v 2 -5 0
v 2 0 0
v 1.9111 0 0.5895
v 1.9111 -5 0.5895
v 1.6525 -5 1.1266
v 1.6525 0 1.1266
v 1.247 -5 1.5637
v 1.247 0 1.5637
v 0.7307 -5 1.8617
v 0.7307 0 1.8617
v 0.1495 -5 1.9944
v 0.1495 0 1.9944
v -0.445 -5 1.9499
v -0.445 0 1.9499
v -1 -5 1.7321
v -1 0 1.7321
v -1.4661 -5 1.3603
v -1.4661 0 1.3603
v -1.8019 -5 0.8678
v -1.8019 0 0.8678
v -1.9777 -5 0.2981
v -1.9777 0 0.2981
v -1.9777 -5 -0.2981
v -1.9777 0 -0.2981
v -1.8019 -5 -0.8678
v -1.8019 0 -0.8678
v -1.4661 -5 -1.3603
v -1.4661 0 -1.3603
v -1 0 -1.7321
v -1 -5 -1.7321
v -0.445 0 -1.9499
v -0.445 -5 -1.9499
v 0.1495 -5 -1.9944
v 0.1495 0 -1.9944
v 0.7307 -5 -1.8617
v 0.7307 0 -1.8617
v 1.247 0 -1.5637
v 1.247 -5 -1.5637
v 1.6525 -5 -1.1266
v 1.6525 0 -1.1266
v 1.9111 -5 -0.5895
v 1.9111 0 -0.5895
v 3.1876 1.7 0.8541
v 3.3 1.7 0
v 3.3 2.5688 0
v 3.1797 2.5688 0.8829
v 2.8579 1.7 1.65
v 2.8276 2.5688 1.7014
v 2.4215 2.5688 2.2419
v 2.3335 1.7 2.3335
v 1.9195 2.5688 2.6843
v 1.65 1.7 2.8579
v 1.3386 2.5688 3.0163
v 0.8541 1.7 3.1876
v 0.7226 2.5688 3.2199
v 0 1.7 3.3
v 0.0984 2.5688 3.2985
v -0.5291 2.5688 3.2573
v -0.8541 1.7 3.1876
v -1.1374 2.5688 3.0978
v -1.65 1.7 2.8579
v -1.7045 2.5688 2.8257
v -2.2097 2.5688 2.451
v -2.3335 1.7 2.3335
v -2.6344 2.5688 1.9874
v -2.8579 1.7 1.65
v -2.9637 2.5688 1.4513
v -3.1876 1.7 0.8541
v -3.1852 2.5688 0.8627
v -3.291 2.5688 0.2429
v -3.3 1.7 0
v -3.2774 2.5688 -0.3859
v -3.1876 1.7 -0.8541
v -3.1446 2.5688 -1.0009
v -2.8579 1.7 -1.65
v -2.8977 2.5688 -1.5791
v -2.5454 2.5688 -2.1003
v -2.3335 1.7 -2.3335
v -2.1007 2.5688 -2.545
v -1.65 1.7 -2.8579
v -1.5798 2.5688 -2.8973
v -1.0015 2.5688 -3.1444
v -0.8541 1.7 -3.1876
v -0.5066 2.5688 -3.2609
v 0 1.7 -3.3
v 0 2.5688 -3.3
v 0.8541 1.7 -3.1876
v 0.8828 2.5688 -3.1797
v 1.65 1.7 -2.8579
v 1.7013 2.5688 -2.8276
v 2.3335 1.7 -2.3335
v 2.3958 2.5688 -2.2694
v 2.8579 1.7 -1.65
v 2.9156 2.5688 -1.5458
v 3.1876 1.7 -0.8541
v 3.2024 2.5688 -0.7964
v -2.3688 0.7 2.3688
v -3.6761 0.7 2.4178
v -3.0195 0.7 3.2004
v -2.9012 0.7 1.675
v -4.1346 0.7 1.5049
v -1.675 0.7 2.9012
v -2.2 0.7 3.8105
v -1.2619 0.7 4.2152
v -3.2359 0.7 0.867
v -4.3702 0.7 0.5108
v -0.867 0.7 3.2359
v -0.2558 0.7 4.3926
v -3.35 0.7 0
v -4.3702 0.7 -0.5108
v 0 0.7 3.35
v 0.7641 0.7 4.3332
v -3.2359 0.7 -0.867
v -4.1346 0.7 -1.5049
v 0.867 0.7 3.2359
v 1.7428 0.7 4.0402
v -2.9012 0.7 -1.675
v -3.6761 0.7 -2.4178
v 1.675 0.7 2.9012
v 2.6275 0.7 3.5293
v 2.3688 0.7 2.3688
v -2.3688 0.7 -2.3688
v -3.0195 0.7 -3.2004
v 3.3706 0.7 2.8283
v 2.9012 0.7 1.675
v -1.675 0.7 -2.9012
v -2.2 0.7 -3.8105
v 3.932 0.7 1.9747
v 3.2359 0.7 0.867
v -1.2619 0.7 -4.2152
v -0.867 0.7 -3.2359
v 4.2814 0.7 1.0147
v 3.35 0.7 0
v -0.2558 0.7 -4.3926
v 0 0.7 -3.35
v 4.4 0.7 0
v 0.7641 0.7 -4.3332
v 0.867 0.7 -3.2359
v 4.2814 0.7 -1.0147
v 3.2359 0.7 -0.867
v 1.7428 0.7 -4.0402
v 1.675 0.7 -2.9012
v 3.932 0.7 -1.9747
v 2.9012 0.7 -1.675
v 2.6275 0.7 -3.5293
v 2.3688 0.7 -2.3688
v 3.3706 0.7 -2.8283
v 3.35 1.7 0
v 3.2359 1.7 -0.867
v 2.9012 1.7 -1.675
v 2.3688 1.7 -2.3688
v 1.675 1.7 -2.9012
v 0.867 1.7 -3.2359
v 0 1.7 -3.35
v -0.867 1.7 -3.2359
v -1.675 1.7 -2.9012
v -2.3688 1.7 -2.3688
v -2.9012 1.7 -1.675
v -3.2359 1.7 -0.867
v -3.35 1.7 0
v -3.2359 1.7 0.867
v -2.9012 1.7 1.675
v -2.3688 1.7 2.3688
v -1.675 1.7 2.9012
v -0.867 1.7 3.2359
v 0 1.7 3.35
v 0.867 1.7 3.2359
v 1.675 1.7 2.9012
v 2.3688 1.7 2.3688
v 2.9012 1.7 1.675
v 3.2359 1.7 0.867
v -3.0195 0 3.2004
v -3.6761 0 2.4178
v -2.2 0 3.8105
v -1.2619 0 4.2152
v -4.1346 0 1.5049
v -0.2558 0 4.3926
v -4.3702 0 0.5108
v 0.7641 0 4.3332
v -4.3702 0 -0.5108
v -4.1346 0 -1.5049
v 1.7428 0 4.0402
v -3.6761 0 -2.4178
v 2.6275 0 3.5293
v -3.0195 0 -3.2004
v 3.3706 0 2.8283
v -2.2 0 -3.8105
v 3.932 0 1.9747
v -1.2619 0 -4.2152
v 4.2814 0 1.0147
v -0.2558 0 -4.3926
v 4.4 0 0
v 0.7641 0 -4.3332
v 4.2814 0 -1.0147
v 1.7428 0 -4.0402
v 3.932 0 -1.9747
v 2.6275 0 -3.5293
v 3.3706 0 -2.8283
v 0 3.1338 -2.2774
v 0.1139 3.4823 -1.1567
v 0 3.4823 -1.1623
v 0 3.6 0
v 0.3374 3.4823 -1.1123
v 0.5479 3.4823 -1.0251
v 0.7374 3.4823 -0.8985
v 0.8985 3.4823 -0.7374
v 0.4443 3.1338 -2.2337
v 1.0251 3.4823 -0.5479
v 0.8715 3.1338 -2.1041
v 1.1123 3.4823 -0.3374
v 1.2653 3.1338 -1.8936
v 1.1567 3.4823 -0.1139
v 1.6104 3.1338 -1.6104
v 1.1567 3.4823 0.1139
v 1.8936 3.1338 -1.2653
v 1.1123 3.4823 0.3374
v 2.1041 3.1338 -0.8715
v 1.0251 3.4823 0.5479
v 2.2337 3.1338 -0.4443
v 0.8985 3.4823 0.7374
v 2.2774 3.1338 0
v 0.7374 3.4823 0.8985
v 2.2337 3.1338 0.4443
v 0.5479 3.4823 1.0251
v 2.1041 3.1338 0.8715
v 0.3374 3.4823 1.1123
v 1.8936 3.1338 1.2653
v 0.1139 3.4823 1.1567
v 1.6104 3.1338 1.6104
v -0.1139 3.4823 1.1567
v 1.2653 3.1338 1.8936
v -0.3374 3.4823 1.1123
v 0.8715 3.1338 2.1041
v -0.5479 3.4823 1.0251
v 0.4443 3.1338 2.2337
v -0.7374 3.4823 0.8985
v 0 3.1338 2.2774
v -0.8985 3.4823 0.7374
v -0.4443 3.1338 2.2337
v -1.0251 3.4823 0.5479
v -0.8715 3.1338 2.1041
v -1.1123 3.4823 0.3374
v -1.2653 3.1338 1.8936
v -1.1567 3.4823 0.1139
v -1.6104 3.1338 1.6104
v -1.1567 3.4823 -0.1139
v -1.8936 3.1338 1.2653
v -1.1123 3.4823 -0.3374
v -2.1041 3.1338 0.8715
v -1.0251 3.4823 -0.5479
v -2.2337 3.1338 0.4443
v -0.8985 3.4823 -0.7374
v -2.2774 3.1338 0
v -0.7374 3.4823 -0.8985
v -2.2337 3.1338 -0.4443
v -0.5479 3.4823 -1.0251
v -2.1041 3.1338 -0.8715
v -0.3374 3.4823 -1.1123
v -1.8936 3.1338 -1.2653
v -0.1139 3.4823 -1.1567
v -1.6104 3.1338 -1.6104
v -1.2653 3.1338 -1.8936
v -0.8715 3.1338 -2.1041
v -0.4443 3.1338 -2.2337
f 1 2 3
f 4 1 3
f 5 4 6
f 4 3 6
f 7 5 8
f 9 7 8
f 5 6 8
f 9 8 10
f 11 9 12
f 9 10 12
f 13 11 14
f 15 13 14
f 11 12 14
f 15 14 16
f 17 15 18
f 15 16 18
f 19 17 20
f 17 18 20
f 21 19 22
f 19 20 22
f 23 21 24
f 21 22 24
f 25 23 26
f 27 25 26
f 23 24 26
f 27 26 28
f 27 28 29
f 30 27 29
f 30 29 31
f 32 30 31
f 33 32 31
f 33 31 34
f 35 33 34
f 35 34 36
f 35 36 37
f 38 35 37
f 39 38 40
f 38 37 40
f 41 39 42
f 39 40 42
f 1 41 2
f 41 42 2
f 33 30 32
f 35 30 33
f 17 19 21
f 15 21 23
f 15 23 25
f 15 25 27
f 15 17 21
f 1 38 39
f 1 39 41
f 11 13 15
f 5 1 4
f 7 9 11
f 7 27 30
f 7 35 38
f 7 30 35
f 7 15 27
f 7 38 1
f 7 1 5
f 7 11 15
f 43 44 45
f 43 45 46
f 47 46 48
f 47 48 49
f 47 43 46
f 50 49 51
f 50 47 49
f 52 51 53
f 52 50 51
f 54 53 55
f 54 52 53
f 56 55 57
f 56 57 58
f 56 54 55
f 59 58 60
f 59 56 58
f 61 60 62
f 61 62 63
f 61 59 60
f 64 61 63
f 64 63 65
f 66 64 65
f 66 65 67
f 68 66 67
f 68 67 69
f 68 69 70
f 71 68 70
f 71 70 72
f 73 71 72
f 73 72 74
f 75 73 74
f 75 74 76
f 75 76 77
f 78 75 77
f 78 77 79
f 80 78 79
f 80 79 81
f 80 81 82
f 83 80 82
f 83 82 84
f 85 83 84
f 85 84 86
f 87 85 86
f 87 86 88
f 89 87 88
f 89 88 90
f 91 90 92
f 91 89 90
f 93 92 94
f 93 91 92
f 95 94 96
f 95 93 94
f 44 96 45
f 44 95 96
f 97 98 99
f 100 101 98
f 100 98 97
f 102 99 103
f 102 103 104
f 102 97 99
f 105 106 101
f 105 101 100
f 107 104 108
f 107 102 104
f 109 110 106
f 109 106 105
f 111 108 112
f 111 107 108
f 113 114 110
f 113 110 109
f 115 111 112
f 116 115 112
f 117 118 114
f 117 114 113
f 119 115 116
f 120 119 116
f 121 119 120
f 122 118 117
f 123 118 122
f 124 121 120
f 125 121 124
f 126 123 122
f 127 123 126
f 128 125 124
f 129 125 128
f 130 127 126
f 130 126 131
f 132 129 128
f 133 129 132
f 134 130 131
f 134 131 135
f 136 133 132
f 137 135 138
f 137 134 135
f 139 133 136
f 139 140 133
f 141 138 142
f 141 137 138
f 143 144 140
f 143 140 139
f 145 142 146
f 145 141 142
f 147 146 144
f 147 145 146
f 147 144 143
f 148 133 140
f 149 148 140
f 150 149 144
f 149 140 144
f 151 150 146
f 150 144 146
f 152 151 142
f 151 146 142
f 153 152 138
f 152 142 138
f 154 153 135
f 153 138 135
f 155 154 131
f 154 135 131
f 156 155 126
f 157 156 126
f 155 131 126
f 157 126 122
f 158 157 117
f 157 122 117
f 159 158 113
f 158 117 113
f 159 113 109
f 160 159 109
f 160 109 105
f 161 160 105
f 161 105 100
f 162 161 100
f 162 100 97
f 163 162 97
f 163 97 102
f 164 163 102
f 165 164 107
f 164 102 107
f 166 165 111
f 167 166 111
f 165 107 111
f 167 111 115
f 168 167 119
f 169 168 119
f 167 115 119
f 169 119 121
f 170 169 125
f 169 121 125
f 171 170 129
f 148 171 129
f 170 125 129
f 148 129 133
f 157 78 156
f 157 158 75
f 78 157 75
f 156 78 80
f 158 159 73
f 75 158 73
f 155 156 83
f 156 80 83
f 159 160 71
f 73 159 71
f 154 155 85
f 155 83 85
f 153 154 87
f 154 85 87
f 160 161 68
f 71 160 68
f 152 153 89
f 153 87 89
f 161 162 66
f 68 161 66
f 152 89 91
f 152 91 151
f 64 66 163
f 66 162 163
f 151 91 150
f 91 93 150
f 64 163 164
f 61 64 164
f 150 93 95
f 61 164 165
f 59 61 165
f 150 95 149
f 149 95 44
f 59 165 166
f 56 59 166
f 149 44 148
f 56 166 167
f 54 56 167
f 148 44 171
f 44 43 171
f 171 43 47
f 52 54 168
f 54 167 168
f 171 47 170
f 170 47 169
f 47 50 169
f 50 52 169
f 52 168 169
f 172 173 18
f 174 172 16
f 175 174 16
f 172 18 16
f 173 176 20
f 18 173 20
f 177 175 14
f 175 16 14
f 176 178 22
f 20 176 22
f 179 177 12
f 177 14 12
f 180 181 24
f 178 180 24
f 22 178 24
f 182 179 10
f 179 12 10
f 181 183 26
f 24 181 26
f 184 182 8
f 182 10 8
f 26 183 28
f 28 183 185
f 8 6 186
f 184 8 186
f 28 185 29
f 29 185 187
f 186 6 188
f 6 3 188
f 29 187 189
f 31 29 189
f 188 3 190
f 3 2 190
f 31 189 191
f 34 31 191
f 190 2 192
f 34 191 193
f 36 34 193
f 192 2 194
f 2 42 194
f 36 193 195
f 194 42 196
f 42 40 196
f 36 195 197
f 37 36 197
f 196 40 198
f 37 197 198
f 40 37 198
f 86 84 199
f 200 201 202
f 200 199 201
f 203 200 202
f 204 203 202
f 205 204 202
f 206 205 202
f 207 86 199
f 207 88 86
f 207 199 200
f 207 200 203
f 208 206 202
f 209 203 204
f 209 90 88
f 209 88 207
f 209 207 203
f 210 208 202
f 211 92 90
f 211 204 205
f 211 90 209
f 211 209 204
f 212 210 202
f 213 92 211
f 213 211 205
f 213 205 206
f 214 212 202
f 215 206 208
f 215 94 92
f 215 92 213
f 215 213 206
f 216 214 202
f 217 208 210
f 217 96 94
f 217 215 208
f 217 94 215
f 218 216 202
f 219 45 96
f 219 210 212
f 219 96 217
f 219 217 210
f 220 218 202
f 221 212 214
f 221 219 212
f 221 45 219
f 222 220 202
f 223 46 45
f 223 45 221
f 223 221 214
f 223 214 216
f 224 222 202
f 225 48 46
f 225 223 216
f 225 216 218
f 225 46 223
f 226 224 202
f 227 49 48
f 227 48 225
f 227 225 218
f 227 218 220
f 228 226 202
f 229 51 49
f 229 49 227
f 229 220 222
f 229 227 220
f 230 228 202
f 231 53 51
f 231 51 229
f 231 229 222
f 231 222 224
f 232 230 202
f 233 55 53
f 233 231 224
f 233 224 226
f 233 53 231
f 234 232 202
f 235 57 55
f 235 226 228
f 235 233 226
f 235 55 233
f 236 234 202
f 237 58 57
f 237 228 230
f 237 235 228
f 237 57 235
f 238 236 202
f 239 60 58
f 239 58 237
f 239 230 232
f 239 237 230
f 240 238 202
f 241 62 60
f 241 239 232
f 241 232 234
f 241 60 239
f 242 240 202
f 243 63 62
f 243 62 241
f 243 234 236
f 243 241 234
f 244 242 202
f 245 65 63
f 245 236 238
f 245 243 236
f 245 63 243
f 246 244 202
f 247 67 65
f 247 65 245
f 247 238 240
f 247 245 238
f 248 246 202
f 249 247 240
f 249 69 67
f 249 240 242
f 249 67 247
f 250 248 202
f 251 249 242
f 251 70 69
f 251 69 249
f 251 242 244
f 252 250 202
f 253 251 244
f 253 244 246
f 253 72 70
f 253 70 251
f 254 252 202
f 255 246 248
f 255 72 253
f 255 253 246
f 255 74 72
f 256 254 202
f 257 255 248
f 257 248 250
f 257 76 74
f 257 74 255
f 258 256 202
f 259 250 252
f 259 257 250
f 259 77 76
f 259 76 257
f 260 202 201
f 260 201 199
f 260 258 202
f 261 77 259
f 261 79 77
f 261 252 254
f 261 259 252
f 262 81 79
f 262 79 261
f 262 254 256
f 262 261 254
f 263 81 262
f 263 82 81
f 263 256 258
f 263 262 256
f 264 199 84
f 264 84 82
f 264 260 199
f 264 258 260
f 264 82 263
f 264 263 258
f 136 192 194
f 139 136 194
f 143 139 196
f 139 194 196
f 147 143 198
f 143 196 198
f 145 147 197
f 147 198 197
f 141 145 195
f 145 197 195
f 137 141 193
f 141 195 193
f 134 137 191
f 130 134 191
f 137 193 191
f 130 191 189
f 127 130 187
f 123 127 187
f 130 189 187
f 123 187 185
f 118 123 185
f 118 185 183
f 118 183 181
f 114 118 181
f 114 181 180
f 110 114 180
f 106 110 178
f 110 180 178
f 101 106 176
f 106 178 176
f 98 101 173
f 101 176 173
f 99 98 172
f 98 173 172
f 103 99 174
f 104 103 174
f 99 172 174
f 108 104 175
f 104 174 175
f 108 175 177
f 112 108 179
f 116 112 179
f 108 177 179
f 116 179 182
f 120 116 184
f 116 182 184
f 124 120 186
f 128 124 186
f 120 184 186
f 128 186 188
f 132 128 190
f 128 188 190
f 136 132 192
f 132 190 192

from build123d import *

# Parameters (mm, degrees)
SKETCH_1_R          = 4.4
EXTRUDE_1_DEPTH     = 0.7
SKETCH_2_R          = 3.35
EXTRUDE_2_DEPTH     = 1
SKETCH_3_R          = 3.4
EXTRUDE_3_DEPTH     = 1.9
SKETCH_4_R          = 10.526345736
SKETCH_4_R_2        = 3.3
CUT_EXTRUDE_1_DEPTH = 1
SKETCH_6_R          = 2
EXTRUDE_4_DEPTH     = 5


with BuildPart() as part:
    # 草图1 → 凸台-拉伸1 (new body)
    with BuildSketch(Plane(origin=(0, 0, 0), x_dir=(1, 0, 0), z_dir=(0, 1, 0))):
        Circle(SKETCH_1_R)
    extrude(amount=EXTRUDE_1_DEPTH)

    # 草图2 → 凸台-拉伸2 (add)
    with BuildSketch(Plane(origin=(0, 0.7, 0), x_dir=(1, 0, 0), z_dir=(0, 1, 0))):
        Circle(SKETCH_2_R)
    extrude(amount=EXTRUDE_2_DEPTH)

    # 草图3 → 凸台-拉伸3 (add)
    with BuildSketch(Plane(origin=(0, 1.7, 0), x_dir=(1, 0, 0), z_dir=(0, 1, 0))):
        Circle(SKETCH_3_R)
    extrude(amount=EXTRUDE_3_DEPTH)

    # 草图4 → 切除-拉伸1 (cut)
    with BuildSketch(Plane.XZ.offset(-1.7)):
        Circle(SKETCH_4_R)
        Circle(SKETCH_4_R_2, mode=Mode.SUBTRACT)
    extrude(amount=-CUT_EXTRUDE_1_DEPTH, mode=Mode.SUBTRACT)

    # 草图6 → 凸台-拉伸4 (add)
    with BuildSketch(Plane.XZ):
        Circle(SKETCH_6_R)
    extrude(amount=EXTRUDE_4_DEPTH)

    # 草图8 → 切除-旋转3 (revolve, cut)
    with BuildSketch(Plane(origin=(0, 0, 0), x_dir=(0, 0, -1), z_dir=(1, 0, 0))):
        with BuildLine():
            Line((0, 4.687391613), (0, 3.6))
            ThreePointArc((0, 3.6), (3.540607137, 2.39280141), (5.606264331, -0.72589827))
            Line((5.606264331, -0.72589827), (5.606264331, 4.687391613))
            Line((5.606264331, 4.687391613), (0, 4.687391613))
        make_face()
    revolve(axis=Axis((0, 3.6, 0), (0, -1, 0)), mode=Mode.SUBTRACT)


solid = part.part
